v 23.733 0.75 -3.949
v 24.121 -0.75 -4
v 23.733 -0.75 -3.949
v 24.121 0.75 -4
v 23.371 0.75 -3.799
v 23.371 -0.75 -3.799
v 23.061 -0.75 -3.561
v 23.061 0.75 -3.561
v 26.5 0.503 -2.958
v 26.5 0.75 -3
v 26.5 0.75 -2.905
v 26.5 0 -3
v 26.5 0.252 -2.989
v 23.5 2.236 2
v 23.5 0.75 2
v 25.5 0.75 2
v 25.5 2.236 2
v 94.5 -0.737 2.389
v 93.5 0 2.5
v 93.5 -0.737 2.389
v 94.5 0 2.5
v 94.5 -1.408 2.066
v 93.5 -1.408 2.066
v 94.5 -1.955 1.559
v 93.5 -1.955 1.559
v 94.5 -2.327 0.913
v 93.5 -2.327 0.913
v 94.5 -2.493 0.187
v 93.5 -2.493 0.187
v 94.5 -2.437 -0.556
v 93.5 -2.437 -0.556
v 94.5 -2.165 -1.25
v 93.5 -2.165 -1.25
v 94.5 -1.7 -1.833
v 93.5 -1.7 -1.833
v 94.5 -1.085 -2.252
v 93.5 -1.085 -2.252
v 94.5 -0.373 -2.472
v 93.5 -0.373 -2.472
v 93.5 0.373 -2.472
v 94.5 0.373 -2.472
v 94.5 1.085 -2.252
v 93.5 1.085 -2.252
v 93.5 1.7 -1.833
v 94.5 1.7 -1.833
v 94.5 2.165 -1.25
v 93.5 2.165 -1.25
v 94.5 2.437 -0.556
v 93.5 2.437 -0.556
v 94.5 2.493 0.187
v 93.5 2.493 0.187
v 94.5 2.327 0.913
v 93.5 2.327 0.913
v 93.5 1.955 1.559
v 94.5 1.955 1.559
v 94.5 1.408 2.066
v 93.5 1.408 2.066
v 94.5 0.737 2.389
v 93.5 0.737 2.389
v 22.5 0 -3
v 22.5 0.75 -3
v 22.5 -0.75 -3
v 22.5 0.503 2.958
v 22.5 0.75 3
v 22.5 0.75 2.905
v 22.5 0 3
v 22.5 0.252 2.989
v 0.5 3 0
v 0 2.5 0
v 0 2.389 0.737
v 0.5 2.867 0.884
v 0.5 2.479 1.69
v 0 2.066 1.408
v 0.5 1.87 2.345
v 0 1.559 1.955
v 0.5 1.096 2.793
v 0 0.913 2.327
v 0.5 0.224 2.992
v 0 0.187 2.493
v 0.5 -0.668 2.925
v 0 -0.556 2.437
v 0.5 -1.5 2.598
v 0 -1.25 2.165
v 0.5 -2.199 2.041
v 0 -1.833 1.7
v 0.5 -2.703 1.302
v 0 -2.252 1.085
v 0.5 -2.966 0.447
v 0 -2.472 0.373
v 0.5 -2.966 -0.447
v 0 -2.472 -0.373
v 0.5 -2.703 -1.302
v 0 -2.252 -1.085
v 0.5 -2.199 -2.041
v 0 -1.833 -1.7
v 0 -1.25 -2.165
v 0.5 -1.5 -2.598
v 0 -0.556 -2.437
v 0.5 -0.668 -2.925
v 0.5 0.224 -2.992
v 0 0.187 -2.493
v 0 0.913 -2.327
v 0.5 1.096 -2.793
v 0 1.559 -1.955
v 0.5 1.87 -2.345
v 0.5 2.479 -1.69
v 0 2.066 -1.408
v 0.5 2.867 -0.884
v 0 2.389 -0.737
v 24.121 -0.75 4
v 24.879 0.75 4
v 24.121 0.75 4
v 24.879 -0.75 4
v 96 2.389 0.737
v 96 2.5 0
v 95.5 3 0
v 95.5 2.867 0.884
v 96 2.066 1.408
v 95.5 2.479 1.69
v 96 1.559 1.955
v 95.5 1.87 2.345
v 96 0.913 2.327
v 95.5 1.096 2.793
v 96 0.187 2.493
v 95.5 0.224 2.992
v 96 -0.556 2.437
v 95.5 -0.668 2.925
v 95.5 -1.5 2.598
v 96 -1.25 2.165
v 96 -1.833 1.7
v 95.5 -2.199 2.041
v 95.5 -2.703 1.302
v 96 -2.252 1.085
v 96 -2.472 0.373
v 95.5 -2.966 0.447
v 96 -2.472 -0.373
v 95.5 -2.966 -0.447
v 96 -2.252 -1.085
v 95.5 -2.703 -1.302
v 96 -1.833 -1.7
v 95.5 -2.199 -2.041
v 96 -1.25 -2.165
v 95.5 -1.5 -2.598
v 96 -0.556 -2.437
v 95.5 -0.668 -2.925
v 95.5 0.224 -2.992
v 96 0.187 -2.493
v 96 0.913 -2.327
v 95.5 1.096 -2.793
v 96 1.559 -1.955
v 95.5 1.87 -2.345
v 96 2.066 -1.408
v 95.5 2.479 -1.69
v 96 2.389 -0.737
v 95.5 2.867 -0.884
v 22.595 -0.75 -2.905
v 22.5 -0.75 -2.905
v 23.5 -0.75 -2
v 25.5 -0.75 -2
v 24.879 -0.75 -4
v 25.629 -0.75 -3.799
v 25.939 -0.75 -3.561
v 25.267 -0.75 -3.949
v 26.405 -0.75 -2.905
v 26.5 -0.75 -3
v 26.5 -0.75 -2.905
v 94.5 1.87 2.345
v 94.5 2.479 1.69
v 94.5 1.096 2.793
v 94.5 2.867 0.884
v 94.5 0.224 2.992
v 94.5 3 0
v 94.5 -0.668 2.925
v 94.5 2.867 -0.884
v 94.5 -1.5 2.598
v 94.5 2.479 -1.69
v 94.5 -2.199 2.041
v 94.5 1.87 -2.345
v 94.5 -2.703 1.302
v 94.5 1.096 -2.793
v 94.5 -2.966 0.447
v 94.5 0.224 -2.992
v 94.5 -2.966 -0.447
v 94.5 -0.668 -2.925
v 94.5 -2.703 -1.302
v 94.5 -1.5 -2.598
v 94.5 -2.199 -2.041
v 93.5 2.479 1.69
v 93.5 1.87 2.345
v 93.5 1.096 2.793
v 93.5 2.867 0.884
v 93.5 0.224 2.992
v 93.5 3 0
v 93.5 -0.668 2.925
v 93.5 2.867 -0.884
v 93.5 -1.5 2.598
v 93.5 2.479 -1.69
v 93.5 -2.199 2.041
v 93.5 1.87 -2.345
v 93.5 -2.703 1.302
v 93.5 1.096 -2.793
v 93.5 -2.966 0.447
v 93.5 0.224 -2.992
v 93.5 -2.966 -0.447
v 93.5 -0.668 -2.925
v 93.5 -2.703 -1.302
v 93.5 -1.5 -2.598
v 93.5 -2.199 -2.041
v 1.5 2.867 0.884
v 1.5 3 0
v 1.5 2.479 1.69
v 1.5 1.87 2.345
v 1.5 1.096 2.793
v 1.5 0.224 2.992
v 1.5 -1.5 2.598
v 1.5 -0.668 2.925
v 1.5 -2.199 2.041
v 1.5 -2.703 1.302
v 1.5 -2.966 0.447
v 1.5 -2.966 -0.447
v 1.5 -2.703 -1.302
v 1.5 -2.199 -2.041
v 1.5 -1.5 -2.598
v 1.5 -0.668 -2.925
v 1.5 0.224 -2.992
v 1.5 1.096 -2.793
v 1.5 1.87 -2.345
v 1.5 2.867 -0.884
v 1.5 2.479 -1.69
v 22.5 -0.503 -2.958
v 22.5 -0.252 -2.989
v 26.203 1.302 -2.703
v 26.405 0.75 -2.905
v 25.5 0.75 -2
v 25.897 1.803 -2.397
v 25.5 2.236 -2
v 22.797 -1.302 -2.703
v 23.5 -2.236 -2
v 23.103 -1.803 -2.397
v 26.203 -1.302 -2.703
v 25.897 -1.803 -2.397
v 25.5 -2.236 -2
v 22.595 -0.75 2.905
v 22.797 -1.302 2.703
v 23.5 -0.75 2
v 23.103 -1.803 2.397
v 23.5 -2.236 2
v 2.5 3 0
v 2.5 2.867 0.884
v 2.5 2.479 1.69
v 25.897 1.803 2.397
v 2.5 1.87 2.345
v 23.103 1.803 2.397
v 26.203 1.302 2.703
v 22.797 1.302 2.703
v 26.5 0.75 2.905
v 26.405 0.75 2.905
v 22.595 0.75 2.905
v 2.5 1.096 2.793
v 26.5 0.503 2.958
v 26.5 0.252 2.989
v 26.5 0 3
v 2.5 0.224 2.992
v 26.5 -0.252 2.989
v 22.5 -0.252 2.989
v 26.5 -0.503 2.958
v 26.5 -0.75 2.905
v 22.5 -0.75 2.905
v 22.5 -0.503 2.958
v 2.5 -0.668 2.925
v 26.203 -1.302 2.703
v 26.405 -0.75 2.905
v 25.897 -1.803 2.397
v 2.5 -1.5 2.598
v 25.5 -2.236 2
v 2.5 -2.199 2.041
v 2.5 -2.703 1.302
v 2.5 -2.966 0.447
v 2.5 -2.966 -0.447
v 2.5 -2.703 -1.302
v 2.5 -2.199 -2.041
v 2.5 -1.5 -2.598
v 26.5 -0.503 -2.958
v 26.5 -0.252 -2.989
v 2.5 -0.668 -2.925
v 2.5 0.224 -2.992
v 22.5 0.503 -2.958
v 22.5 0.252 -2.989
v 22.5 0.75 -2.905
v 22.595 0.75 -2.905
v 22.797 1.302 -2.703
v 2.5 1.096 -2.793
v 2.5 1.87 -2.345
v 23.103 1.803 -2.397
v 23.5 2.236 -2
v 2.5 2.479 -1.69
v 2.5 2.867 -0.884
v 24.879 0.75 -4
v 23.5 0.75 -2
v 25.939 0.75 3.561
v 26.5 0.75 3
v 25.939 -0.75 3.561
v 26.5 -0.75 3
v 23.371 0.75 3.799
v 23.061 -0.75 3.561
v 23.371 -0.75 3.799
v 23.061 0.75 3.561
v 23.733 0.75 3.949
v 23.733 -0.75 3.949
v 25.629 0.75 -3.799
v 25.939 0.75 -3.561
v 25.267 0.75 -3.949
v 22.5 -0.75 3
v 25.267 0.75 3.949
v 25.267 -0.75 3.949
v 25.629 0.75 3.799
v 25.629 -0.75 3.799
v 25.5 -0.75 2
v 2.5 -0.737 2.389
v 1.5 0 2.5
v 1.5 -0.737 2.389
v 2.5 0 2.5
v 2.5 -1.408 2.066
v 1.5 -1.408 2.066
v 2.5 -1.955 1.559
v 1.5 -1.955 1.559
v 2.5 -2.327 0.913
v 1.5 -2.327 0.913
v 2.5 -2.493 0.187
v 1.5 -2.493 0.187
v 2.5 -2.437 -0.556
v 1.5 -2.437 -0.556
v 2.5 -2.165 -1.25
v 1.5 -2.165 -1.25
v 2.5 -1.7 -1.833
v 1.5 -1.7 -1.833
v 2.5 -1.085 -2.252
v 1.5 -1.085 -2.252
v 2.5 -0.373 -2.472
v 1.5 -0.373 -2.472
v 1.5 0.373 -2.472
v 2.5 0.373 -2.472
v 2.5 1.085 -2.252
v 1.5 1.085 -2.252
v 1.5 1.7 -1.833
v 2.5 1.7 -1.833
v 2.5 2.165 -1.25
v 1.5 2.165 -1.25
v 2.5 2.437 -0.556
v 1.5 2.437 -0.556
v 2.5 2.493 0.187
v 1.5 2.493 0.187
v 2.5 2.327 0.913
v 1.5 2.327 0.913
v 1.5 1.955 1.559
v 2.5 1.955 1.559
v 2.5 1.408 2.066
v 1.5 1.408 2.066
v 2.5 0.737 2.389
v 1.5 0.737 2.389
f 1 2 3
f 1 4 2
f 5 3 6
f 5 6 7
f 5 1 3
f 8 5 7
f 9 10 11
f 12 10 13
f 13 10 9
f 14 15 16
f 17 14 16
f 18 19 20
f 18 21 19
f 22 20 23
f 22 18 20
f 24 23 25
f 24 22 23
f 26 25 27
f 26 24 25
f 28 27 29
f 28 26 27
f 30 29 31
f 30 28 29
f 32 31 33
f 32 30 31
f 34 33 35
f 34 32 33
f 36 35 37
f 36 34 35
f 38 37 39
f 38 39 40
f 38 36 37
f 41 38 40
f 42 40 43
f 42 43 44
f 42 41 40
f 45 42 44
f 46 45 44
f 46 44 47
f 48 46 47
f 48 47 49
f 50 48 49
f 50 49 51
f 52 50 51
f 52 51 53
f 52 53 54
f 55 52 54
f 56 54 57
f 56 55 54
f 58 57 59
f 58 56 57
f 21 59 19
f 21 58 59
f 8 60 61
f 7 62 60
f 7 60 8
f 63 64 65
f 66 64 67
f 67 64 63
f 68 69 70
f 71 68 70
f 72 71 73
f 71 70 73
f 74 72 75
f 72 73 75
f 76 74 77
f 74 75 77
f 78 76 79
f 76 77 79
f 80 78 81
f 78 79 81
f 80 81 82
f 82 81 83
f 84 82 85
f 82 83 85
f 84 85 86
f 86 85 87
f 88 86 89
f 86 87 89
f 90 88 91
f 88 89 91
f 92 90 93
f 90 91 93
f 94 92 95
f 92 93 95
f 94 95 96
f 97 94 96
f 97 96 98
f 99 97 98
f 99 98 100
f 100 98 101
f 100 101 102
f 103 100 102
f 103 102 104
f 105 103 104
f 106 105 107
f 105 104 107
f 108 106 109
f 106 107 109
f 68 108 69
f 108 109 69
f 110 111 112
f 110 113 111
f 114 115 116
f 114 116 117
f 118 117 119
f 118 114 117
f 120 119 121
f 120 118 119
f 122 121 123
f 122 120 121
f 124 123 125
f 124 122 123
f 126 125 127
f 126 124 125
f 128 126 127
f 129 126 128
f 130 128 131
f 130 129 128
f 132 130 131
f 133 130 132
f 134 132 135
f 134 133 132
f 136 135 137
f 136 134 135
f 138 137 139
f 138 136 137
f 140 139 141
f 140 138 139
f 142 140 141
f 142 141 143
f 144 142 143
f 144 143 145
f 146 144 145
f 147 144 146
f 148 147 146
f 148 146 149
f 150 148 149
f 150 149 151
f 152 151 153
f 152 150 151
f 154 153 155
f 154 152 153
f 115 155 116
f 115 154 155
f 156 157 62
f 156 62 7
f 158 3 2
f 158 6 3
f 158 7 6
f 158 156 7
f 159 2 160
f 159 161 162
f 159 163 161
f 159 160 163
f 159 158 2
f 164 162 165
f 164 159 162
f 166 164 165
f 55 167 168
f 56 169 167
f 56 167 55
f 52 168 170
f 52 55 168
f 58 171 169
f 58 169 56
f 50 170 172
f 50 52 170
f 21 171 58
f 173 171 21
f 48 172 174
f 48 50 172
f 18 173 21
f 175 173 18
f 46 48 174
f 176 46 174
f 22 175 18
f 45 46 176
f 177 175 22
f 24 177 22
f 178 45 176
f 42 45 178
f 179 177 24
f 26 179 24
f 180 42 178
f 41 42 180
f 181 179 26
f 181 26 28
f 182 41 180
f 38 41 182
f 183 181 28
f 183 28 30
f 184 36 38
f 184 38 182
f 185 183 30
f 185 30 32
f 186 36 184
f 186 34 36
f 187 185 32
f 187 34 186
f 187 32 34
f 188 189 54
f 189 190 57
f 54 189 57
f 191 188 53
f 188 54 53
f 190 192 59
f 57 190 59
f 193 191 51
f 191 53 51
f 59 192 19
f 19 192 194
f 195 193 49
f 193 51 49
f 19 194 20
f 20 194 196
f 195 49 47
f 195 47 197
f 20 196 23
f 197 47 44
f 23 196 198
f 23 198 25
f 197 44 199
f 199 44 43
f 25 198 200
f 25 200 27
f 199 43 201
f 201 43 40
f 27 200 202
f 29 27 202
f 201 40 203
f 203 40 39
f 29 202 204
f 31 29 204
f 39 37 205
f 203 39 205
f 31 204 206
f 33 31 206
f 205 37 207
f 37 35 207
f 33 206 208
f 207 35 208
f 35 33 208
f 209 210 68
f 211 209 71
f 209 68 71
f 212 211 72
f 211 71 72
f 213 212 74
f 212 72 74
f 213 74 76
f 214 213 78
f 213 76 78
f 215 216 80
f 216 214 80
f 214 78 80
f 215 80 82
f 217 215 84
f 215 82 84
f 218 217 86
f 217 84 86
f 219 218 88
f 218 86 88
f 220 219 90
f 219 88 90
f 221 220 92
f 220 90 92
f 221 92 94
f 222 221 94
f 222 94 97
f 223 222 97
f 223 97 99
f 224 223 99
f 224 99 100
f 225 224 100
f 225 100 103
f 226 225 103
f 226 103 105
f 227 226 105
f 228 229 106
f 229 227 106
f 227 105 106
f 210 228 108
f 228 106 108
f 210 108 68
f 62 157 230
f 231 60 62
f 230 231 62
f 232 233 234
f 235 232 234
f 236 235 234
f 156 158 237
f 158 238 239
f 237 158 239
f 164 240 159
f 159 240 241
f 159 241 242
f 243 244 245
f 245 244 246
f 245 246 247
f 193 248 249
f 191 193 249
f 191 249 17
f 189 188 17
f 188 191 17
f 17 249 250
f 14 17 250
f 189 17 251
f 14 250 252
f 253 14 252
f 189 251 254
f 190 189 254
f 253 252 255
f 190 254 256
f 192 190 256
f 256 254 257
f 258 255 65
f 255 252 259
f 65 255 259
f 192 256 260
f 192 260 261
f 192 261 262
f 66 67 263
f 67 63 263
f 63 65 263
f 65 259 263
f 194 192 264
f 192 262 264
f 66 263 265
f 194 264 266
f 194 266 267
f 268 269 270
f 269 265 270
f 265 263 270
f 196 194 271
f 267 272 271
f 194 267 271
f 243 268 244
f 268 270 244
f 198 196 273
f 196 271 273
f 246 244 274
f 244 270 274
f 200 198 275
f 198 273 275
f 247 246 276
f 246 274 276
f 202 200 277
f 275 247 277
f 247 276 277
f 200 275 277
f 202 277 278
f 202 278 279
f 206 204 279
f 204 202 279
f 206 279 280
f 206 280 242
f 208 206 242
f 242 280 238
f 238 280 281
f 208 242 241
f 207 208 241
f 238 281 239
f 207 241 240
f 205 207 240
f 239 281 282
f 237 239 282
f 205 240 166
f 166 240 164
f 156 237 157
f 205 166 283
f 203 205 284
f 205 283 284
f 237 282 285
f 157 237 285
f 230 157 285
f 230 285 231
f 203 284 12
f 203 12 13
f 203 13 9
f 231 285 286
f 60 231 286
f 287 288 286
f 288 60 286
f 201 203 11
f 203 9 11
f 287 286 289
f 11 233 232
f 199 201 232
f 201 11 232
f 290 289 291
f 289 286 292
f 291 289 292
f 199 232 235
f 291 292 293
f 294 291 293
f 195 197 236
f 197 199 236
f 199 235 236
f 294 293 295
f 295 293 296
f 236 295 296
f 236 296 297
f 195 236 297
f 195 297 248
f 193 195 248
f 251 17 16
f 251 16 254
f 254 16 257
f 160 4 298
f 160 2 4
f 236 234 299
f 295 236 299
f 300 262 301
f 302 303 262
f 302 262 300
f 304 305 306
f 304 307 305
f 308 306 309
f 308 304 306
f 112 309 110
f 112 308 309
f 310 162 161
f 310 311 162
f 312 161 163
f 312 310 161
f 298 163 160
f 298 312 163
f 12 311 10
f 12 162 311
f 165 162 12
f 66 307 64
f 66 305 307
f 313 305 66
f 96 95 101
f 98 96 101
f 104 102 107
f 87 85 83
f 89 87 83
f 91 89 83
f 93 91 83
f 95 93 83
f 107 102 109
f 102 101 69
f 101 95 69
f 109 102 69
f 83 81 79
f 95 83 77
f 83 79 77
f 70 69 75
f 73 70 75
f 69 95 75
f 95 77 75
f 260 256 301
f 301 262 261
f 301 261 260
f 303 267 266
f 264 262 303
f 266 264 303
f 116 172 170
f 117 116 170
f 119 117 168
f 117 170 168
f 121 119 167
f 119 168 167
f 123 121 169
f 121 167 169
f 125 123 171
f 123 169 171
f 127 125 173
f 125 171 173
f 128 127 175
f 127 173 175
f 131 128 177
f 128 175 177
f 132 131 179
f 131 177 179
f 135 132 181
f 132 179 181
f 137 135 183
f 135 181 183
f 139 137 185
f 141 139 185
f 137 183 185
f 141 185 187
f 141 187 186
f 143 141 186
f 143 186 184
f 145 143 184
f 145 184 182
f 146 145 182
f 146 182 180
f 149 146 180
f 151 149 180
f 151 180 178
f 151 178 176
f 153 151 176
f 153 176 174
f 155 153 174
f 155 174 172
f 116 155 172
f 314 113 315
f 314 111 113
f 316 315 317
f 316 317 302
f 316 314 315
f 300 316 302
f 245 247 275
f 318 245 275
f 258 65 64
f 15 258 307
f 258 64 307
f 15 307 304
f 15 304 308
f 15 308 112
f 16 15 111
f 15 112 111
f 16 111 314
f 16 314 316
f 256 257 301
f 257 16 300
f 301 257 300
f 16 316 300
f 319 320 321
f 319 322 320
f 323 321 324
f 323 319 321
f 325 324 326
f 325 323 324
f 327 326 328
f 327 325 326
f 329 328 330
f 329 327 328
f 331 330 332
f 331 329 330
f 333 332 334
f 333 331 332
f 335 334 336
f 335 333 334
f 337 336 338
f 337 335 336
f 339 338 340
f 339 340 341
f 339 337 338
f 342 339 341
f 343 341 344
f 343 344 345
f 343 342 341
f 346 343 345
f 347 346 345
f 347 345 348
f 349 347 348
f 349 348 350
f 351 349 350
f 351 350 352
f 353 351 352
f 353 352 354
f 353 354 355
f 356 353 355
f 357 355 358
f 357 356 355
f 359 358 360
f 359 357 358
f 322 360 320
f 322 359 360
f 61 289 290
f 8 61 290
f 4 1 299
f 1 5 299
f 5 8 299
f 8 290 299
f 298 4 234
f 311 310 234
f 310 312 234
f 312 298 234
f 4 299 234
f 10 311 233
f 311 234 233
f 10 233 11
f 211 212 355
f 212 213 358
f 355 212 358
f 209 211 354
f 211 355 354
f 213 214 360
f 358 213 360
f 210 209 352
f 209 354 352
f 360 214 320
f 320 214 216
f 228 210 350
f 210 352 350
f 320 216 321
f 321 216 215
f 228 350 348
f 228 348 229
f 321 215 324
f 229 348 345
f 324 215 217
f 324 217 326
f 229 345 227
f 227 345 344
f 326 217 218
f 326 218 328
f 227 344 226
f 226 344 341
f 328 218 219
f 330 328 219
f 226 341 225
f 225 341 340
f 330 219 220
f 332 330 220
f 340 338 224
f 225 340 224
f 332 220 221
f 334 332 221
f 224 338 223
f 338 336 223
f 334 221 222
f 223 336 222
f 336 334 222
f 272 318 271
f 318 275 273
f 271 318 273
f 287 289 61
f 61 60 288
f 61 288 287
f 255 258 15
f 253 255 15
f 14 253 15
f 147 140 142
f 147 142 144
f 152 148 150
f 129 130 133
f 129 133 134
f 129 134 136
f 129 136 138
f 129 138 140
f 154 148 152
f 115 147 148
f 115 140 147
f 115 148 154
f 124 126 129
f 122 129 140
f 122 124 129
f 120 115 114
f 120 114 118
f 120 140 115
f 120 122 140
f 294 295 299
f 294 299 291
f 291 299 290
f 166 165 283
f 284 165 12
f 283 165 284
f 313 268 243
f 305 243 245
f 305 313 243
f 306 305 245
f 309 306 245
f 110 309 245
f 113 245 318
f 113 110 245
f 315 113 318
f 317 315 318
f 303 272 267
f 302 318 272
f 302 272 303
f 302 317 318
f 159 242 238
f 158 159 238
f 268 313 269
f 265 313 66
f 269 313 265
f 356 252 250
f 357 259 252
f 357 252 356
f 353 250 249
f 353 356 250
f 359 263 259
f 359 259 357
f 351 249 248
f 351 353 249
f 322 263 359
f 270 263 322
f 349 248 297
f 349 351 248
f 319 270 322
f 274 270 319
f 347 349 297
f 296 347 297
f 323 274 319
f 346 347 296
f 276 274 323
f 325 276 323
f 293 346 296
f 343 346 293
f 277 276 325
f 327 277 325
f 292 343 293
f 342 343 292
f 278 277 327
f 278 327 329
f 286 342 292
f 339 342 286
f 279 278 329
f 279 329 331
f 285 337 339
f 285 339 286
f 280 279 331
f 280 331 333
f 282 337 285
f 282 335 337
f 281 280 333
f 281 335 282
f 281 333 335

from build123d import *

# Parameters (mm, degrees)
F0_R          = 3
F1_DEPTH      = 96
F2_SIZE       = 0.5
F3_W          = 1
F3_H          = 1
F6_DEPTH      = 3.001
F6_DEPTH_BACK = 25
F8_DEPTH      = 0.75
F8_DEPTH_BACK = 0.75
F9_R          = 1.5


with BuildPart() as f1:
    # F0 (on Right) → F1 (new body)
    with BuildSketch(Plane.YZ):
        Circle(F0_R)
    extrude(amount=F1_DEPTH)

    # F2
    f2_edges = [f1.edges().sort_by_distance(p)[0] for p in [
        (0, -3, 0),
        (96, -3, 0),
    ]]
    chamfer(f2_edges, length=F2_SIZE)

    # F3 (on Front) → F4 (revolve, cut)
    with BuildSketch(Plane.XZ):
        with Locations((2, 3)):
            Rectangle(F3_W, F3_H)
        with Locations((94, 3)):
            Rectangle(F3_W, F3_H)
    revolve(axis=Axis((48.1495447457, 0, 0), (1, 0, 0)), mode=Mode.SUBTRACT)

    # F5 (on Front) → F6 (cut, two sides)
    with BuildSketch(Plane.XZ) as f6_sk:
        Polygon((26.5, 4), (22.5, 4), (22.5, 3), (23.5, 2), (25.5, 2), (26.5, 3), align=None)
        Polygon((26.5, -4), (26.5, -3), (25.5, -2), (23.5, -2), (22.5, -3), (22.5, -4), align=None)
    extrude(amount=-F6_DEPTH, mode=Mode.SUBTRACT)
    extrude(f6_sk.sketch, amount=F6_DEPTH_BACK, mode=Mode.SUBTRACT)

    # F7 (on Front) → F8 (join, two sides)
    with BuildSketch(Plane.XZ) as f8_sk:
        Polygon((22.5, 3), (22.5, 2), (26.5, 2), (26.5, 3), (25.5, 4), (23.5, 4), align=None)
        Polygon((22.5, -2), (22.5, -3), (23.5, -4), (25.5, -4), (26.5, -3), (26.5, -2), align=None)
    extrude(amount=F8_DEPTH)
    extrude(f8_sk.sketch, amount=-F8_DEPTH_BACK)

    # F9
    f9_edges = [f1.edges().sort_by_distance(p)[0] for p in [
        (23.5, 0, -4),
        (25.5, 0, -4),
        (23.5, 0, 4),
        (25.5, 0, 4),
    ]]
    fillet(f9_edges, radius=F9_R)


solid = f1.part
